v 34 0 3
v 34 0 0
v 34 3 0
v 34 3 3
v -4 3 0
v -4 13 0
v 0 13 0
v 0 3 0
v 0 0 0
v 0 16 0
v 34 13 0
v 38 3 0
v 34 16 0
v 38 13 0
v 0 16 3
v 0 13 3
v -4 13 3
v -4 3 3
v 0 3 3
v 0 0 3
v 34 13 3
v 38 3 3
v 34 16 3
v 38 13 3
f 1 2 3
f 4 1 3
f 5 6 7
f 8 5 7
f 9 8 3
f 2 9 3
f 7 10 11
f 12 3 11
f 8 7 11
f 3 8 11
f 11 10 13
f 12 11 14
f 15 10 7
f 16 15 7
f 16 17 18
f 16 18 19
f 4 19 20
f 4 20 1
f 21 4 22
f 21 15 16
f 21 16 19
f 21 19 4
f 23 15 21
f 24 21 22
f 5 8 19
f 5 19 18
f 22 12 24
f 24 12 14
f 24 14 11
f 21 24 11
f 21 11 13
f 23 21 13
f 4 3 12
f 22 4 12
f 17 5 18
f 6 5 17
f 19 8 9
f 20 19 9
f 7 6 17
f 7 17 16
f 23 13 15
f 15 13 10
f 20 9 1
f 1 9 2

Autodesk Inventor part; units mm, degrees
ref_plane "YZ Plane" through (0, 0, 0) normal (1, 0, 0) x (0, 1, 0)
ref_plane "XZ Plane" through (0, 0, 0) normal (0, 1, 0) x (-1, 0, 0)
ref_plane "XY Plane" through (0, 0, 0) normal (0, 0, 1) x (1, 0, 0)
sketch "Sketch1" plane through (0, 0, 0) normal (0, 0, 1) x (1, 0, 0)
  line L0 (0, 0) -> (34, 0)
  line L1 (34, 0) -> (34, 16)
  line L2 (34, 16) -> (0, 16)
  line L3 (0, 16) -> (0, 0)
  line L4 (-4, 13) -> (0, 13)
  line L5 (0, 13) -> (0, 3)
  line L6 (0, 3) -> (-4, 3)
  line L7 (-4, 3) -> (-4, 13)
  line L8 (-4, 13) -> (0, 3) construction
  line L9 (0, 13) -> (-4, 3) construction
  line L10 (38, 13) -> (34, 13)
  line L11 (34, 13) -> (34, 3)
  line L12 (34, 3) -> (38, 3)
  line L13 (38, 3) -> (38, 13)
  line L14 (38, 13) -> (34, 3) construction
  line L15 (34, 13) -> (38, 3) construction
  point P0 (-2, 8)
  point P1 (36, 8)
  point P2 (0, 8)
  point P3 (0, 8)
  point P4 (0, 13)
  dimension "d0" = 34
  dimension "d1" = 16
  dimension "d2" = 4
  dimension "d3" = 4
  dimension "d4" = 10
  dimension "d5" = 10
extrude "Extrusion1" add sketch "Sketch1" along normal blind 3
properties part number "Frontrail"
